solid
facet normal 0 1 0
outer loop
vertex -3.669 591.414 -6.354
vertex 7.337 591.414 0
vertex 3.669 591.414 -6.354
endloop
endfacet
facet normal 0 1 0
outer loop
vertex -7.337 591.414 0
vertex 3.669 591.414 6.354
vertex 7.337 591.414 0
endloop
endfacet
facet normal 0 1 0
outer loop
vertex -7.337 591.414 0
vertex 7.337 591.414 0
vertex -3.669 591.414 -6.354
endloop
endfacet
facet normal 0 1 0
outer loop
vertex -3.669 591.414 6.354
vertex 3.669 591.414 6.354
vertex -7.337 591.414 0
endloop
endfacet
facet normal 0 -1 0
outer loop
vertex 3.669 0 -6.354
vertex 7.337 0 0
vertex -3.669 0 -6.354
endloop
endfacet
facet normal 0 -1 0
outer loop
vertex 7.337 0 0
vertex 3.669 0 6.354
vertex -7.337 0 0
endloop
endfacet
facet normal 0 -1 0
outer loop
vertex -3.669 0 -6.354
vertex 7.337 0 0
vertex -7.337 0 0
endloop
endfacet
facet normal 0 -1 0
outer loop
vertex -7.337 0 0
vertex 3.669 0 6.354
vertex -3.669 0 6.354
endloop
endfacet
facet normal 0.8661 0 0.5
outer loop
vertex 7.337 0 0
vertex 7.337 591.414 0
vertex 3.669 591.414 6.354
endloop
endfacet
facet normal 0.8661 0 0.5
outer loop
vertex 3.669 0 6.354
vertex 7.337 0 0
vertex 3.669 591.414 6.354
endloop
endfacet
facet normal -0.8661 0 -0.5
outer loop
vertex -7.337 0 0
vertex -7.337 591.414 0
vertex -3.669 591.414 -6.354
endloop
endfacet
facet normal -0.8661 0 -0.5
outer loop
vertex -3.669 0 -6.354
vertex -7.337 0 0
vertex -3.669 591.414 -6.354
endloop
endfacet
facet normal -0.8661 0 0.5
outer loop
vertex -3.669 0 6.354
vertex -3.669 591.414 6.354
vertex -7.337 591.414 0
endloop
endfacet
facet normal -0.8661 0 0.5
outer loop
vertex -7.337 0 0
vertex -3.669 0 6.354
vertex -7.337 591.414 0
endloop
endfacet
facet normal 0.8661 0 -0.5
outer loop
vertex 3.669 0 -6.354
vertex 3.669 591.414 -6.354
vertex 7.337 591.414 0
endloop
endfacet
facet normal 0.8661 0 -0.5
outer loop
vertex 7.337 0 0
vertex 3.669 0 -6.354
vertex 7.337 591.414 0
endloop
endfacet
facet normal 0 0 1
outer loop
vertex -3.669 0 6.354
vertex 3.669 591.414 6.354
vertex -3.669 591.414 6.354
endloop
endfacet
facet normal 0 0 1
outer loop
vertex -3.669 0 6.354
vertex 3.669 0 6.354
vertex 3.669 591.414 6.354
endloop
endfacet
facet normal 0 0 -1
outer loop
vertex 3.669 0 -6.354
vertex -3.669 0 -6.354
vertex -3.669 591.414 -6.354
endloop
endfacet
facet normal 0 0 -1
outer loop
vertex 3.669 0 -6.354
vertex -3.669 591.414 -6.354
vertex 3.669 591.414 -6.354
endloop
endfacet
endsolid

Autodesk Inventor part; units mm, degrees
ref_plane "YZ Plane" through (0, 0, 0) normal (1, 0, 0) x (0, 1, 0)
ref_plane "XZ Plane" through (0, 0, 0) normal (0, 1, 0) x (-1, 0, 0)
ref_plane "XY Plane" through (0, 0, 0) normal (0, 0, 1) x (1, 0, 0)
sketch "Sketch1" plane through (0, 0, 0) normal (0, 1, 0) x (-1, 0, 0)
  line L0 (-3.6687, -6.3544) -> (-7.3374, 0)
  line L1 (-7.3374, 0) -> (-3.6687, 6.3544)
  line L2 (-3.6687, 6.3544) -> (3.6687, 6.3544)
  line L3 (3.6687, 6.3544) -> (7.3374, 0)
  line L4 (7.3374, 0) -> (3.6687, -6.3544)
  line L5 (3.6687, -6.3544) -> (-3.6687, -6.3544)
  point P0 (0, 0)
  point P1 (0, 0)
extrude "Extrusion1" add sketch "Sketch1" along normal blind 591.4136
properties part number "Elevator Drive Shaft"
